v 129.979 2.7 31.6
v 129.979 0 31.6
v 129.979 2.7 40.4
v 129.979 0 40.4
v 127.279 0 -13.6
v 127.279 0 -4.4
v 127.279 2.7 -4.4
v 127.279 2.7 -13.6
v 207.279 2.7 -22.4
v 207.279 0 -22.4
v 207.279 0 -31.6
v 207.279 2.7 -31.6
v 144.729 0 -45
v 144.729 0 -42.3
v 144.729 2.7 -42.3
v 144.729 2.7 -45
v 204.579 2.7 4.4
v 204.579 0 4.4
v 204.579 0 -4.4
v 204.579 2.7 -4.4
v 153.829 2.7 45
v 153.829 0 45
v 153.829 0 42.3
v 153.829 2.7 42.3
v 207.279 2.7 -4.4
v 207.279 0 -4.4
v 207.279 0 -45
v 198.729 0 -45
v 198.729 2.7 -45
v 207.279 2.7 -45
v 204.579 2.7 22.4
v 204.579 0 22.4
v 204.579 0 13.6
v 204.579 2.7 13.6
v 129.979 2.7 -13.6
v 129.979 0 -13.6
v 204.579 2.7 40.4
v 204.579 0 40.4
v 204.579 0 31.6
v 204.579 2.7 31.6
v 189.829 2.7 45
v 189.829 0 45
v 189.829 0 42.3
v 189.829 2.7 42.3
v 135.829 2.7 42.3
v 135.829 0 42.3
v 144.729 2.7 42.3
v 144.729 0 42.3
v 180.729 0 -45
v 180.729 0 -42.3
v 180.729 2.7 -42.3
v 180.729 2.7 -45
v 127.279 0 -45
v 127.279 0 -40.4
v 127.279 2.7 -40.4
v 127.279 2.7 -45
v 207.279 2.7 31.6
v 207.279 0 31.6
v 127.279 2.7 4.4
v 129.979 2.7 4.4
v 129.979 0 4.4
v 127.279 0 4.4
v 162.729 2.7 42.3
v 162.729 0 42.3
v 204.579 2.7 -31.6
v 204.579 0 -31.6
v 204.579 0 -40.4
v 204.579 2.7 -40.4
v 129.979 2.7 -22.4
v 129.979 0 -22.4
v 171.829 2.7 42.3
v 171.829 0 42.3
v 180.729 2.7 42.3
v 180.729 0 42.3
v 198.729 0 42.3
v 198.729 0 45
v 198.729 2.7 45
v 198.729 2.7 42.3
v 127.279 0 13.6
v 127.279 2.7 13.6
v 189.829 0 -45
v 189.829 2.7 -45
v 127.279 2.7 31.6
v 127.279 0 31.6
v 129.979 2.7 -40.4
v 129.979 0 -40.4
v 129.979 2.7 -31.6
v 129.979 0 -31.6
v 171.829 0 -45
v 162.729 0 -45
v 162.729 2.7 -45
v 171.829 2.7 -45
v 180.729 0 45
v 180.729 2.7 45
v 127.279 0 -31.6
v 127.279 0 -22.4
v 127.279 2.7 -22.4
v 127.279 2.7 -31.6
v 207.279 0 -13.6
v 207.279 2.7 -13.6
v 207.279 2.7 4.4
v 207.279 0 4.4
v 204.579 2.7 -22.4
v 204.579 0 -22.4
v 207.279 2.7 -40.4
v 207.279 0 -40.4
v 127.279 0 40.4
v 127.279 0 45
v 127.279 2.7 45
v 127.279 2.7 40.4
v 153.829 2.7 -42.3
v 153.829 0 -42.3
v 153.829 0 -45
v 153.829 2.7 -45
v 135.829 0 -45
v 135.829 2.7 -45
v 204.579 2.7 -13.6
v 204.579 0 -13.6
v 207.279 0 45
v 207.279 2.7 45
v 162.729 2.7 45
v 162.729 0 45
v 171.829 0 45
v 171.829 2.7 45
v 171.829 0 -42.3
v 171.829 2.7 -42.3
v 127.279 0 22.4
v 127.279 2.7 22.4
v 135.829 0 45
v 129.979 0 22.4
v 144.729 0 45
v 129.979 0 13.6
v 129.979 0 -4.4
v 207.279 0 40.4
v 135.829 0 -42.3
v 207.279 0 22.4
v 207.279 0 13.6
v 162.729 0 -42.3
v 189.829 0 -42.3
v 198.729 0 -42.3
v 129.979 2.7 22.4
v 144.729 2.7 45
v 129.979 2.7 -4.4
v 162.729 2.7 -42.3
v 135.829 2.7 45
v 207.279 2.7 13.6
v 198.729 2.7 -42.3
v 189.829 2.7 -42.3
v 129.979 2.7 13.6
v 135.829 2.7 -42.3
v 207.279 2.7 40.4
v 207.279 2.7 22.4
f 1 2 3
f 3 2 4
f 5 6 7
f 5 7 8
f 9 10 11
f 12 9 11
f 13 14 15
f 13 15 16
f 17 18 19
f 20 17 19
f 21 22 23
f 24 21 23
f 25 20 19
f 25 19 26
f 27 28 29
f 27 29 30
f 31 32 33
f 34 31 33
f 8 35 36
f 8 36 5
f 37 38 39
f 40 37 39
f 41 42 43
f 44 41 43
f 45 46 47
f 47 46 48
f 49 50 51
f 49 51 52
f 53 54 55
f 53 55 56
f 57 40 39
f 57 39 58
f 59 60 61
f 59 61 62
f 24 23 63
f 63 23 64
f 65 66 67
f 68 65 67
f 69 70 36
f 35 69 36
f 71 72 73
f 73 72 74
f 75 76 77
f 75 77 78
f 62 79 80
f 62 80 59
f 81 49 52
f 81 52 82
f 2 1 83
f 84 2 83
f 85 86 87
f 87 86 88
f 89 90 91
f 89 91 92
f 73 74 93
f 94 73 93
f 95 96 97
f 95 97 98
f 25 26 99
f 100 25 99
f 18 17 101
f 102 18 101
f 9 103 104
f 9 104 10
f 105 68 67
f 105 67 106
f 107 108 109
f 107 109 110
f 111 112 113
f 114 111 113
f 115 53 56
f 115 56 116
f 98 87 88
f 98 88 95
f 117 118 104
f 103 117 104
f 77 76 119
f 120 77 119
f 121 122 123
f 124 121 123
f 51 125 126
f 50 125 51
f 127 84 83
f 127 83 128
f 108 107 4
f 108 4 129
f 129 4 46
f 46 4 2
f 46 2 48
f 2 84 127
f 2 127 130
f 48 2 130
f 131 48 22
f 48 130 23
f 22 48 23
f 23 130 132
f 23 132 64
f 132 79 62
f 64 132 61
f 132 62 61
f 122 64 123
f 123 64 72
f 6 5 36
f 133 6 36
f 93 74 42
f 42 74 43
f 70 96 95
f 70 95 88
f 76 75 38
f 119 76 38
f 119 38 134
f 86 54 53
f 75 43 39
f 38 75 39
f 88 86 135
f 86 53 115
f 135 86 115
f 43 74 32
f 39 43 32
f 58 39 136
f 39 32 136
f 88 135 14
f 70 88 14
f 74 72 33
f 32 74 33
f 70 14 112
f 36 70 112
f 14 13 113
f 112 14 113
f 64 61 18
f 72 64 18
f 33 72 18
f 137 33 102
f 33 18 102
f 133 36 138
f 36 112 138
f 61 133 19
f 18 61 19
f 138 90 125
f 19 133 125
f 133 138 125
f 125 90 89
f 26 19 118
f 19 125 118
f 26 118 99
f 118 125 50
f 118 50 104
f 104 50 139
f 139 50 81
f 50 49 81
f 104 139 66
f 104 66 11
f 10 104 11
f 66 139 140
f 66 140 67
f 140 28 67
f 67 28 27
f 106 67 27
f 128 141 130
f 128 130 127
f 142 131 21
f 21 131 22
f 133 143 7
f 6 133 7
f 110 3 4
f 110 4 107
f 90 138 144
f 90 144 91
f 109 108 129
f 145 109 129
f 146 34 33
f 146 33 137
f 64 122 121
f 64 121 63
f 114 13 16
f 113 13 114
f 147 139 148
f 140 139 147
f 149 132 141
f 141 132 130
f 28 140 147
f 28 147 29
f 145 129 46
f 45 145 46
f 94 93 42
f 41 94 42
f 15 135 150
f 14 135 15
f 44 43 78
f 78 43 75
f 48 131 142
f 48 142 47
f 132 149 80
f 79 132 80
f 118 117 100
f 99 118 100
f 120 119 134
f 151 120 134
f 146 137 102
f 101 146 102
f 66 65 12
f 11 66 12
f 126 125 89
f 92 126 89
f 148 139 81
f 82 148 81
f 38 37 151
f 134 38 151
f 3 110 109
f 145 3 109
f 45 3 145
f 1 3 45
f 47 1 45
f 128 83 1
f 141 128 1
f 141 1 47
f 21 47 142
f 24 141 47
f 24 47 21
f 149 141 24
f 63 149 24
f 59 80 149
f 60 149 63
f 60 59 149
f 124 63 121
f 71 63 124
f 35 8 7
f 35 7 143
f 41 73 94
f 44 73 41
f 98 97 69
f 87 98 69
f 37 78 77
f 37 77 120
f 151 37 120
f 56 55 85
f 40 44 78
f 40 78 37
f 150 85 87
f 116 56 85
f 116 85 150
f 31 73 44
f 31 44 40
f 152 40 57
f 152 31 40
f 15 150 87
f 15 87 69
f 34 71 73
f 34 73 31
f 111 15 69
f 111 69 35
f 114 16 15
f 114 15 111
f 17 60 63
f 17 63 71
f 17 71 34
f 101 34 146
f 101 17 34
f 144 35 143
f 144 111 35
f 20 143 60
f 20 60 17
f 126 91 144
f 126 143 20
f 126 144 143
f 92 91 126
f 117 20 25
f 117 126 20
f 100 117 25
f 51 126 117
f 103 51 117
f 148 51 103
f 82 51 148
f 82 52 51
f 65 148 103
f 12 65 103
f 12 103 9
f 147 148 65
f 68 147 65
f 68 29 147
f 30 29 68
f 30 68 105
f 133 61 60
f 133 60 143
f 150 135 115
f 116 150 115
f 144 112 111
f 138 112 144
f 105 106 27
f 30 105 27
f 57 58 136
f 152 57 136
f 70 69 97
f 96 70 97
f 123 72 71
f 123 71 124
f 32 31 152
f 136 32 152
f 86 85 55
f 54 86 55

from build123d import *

# Parameters (mm, degrees)
ESQUISSE1_W                    = 80
ESQUISSE1_H                    = 90
BOSS_EXTRU_1_DEPTH             = 2.7
ESQUISSE2_W                    = 2.7
ESQUISSE2_H                    = 8.8
ENL_V_MAT_EXTRU_1_DEPTH        = 2.7
R_P_TITION_LIN_AIRE1_COUNT     = 3
R_P_TITION_LIN_AIRE1_PITCH     = 18
R_P_TITION_LIN_AIRE1_COL_COUNT = 3
R_P_TITION_LIN_AIRE1_COL_PITCH = 18
SYM_TRIE1_COPY_1_SKETCH_W      = 2.7
SYM_TRIE1_COPY_1_SKETCH_H      = 8.8
SYM_TRIE1_COPY_1_DEPTH         = 2.7
SYM_TRIE1_COPY_2_SKETCH_W      = 2.7
SYM_TRIE1_COPY_2_SKETCH_H      = 8.8
SYM_TRIE1_COPY_2_DEPTH         = 2.7
SYM_TRIE1_COPY_3_SKETCH_W      = 2.7
SYM_TRIE1_COPY_3_SKETCH_H      = 8.8
SYM_TRIE1_COPY_3_DEPTH         = 2.7
SYM_TRIE1_COPY_4_SKETCH_W      = 2.7
SYM_TRIE1_COPY_4_SKETCH_H      = 8.8
SYM_TRIE1_COPY_4_DEPTH         = 2.7
ESQUISSE3_W                    = 8.9
ESQUISSE3_H                    = 2.7
ENL_V_MAT_EXTRU_2_DEPTH        = 2.7
R_P_TITION_LIN_AIRE2_COUNT     = 2
R_P_TITION_LIN_AIRE2_PITCH     = 18
R_P_TITION_LIN_AIRE2_COL_COUNT = 3
R_P_TITION_LIN_AIRE2_COL_PITCH = 18
SYM_TRIE2_COPY_1_SKETCH_W      = 8.9
SYM_TRIE2_COPY_1_SKETCH_H      = 2.7
SYM_TRIE2_COPY_1_DEPTH         = 2.7
SYM_TRIE2_COPY_2_SKETCH_W      = 8.9
SYM_TRIE2_COPY_2_SKETCH_H      = 2.7
SYM_TRIE2_COPY_2_DEPTH         = 2.7
SYM_TRIE2_COPY_3_SKETCH_W      = 8.9
SYM_TRIE2_COPY_3_SKETCH_H      = 2.7
SYM_TRIE2_COPY_3_DEPTH         = 2.7


with BuildPart() as part:
    # Esquisse1 → Boss.-Extru.1 (new body)
    with BuildSketch(Plane(origin=(0, 0, 0), x_dir=(1, 0, 0), z_dir=(0, 1, 0))):
        with Locations((167.279220614, 0)):
            Rectangle(ESQUISSE1_W, ESQUISSE1_H)
    extrude(amount=BOSS_EXTRU_1_DEPTH)

    # Esquisse2 → Enlèv. mat.-Extru.1 (cut)
    with BuildSketch(Plane(origin=(0, 0, 0), x_dir=(1, 0, 0), z_dir=(0, 1, 0))):
        with Locations((205.929220614, 0)):
            Rectangle(ESQUISSE2_W, ESQUISSE2_H)
    enl_v_mat_extru_1 = extrude(amount=ENL_V_MAT_EXTRU_1_DEPTH, mode=Mode.SUBTRACT)

    # Répétition linéaire1: Enlèv. mat.-Extru.1 ×3
    with Locations(*[(0, 0, i * R_P_TITION_LIN_AIRE1_PITCH) for i in range(1, R_P_TITION_LIN_AIRE1_COUNT)]):
        add(enl_v_mat_extru_1, mode=Mode.SUBTRACT)

    # Répétition linéaire1 col: Enlèv. mat.-Extru.1 ×3
    with Locations(*[(0, 0, -i * R_P_TITION_LIN_AIRE1_COL_PITCH) for i in range(1, R_P_TITION_LIN_AIRE1_COL_COUNT)]):
        add(enl_v_mat_extru_1, mode=Mode.SUBTRACT)

    # Symétrie1: Enlèv. mat.-Extru.1 across plane
    add(enl_v_mat_extru_1.mirror(Plane(origin=(167.279220614, 0, 0), x_dir=(0, 0, 1), z_dir=(1, 0, 0))), mode=Mode.SUBTRACT)

    # Symétrie1 copy 1 sketch → Symétrie1 copy 1 (cut)
    with BuildSketch(Plane(origin=(334.558441227, 0, 18), x_dir=(-1, 0, 0), z_dir=(0, 1, 0))):
        with Locations((205.929220614, 0)):
            Rectangle(SYM_TRIE1_COPY_1_SKETCH_W, SYM_TRIE1_COPY_1_SKETCH_H)
    extrude(amount=SYM_TRIE1_COPY_1_DEPTH, mode=Mode.SUBTRACT)

    # Symétrie1 copy 2 sketch → Symétrie1 copy 2 (cut)
    with BuildSketch(Plane(origin=(334.558441227, 0, 36), x_dir=(-1, 0, 0), z_dir=(0, 1, 0))):
        with Locations((205.929220614, 0)):
            Rectangle(SYM_TRIE1_COPY_2_SKETCH_W, SYM_TRIE1_COPY_2_SKETCH_H)
    extrude(amount=SYM_TRIE1_COPY_2_DEPTH, mode=Mode.SUBTRACT)

    # Symétrie1 copy 3 sketch → Symétrie1 copy 3 (cut)
    with BuildSketch(Plane(origin=(334.558441227, 0, -18), x_dir=(-1, 0, 0), z_dir=(0, 1, 0))):
        with Locations((205.929220614, 0)):
            Rectangle(SYM_TRIE1_COPY_3_SKETCH_W, SYM_TRIE1_COPY_3_SKETCH_H)
    extrude(amount=SYM_TRIE1_COPY_3_DEPTH, mode=Mode.SUBTRACT)

    # Symétrie1 copy 4 sketch → Symétrie1 copy 4 (cut)
    with BuildSketch(Plane(origin=(334.558441227, 0, -36), x_dir=(-1, 0, 0), z_dir=(0, 1, 0))):
        with Locations((205.929220614, 0)):
            Rectangle(SYM_TRIE1_COPY_4_SKETCH_W, SYM_TRIE1_COPY_4_SKETCH_H)
    extrude(amount=SYM_TRIE1_COPY_4_DEPTH, mode=Mode.SUBTRACT)

    # Esquisse3 → Enlèv. mat.-Extru.2 (cut)
    with BuildSketch(Plane(origin=(0, 0, 0), x_dir=(1, 0, 0), z_dir=(0, 1, 0))):
        with Locations((176.279220614, 43.65)):
            Rectangle(ESQUISSE3_W, ESQUISSE3_H)
    enl_v_mat_extru_2 = extrude(amount=ENL_V_MAT_EXTRU_2_DEPTH, mode=Mode.SUBTRACT)

    # Répétition linéaire2: Enlèv. mat.-Extru.2 ×2
    with Locations(*[(i * R_P_TITION_LIN_AIRE2_PITCH, 0, 0) for i in range(1, R_P_TITION_LIN_AIRE2_COUNT)]):
        add(enl_v_mat_extru_2, mode=Mode.SUBTRACT)

    # Répétition linéaire2 col: Enlèv. mat.-Extru.2 ×3
    with Locations(*[(-i * R_P_TITION_LIN_AIRE2_COL_PITCH, 0, 0) for i in range(1, R_P_TITION_LIN_AIRE2_COL_COUNT)]):
        add(enl_v_mat_extru_2, mode=Mode.SUBTRACT)

    # Symétrie2: Enlèv. mat.-Extru.2 across plane
    add(enl_v_mat_extru_2.mirror(Plane.XY), mode=Mode.SUBTRACT)

    # Symétrie2 copy 1 sketch → Symétrie2 copy 1 (cut)
    with BuildSketch(Plane(origin=(18, 0, 0), x_dir=(1, 0, 0), z_dir=(0, 1, 0))):
        with Locations((176.279220614, -43.65)):
            Rectangle(SYM_TRIE2_COPY_1_SKETCH_W, SYM_TRIE2_COPY_1_SKETCH_H)
    extrude(amount=SYM_TRIE2_COPY_1_DEPTH, mode=Mode.SUBTRACT)

    # Symétrie2 copy 2 sketch → Symétrie2 copy 2 (cut)
    with BuildSketch(Plane(origin=(-18, 0, 0), x_dir=(1, 0, 0), z_dir=(0, 1, 0))):
        with Locations((176.279220614, -43.65)):
            Rectangle(SYM_TRIE2_COPY_2_SKETCH_W, SYM_TRIE2_COPY_2_SKETCH_H)
    extrude(amount=SYM_TRIE2_COPY_2_DEPTH, mode=Mode.SUBTRACT)

    # Symétrie2 copy 3 sketch → Symétrie2 copy 3 (cut)
    with BuildSketch(Plane(origin=(-36, 0, 0), x_dir=(1, 0, 0), z_dir=(0, 1, 0))):
        with Locations((176.279220614, -43.65)):
            Rectangle(SYM_TRIE2_COPY_3_SKETCH_W, SYM_TRIE2_COPY_3_SKETCH_H)
    extrude(amount=SYM_TRIE2_COPY_3_DEPTH, mode=Mode.SUBTRACT)


solid = part.part
